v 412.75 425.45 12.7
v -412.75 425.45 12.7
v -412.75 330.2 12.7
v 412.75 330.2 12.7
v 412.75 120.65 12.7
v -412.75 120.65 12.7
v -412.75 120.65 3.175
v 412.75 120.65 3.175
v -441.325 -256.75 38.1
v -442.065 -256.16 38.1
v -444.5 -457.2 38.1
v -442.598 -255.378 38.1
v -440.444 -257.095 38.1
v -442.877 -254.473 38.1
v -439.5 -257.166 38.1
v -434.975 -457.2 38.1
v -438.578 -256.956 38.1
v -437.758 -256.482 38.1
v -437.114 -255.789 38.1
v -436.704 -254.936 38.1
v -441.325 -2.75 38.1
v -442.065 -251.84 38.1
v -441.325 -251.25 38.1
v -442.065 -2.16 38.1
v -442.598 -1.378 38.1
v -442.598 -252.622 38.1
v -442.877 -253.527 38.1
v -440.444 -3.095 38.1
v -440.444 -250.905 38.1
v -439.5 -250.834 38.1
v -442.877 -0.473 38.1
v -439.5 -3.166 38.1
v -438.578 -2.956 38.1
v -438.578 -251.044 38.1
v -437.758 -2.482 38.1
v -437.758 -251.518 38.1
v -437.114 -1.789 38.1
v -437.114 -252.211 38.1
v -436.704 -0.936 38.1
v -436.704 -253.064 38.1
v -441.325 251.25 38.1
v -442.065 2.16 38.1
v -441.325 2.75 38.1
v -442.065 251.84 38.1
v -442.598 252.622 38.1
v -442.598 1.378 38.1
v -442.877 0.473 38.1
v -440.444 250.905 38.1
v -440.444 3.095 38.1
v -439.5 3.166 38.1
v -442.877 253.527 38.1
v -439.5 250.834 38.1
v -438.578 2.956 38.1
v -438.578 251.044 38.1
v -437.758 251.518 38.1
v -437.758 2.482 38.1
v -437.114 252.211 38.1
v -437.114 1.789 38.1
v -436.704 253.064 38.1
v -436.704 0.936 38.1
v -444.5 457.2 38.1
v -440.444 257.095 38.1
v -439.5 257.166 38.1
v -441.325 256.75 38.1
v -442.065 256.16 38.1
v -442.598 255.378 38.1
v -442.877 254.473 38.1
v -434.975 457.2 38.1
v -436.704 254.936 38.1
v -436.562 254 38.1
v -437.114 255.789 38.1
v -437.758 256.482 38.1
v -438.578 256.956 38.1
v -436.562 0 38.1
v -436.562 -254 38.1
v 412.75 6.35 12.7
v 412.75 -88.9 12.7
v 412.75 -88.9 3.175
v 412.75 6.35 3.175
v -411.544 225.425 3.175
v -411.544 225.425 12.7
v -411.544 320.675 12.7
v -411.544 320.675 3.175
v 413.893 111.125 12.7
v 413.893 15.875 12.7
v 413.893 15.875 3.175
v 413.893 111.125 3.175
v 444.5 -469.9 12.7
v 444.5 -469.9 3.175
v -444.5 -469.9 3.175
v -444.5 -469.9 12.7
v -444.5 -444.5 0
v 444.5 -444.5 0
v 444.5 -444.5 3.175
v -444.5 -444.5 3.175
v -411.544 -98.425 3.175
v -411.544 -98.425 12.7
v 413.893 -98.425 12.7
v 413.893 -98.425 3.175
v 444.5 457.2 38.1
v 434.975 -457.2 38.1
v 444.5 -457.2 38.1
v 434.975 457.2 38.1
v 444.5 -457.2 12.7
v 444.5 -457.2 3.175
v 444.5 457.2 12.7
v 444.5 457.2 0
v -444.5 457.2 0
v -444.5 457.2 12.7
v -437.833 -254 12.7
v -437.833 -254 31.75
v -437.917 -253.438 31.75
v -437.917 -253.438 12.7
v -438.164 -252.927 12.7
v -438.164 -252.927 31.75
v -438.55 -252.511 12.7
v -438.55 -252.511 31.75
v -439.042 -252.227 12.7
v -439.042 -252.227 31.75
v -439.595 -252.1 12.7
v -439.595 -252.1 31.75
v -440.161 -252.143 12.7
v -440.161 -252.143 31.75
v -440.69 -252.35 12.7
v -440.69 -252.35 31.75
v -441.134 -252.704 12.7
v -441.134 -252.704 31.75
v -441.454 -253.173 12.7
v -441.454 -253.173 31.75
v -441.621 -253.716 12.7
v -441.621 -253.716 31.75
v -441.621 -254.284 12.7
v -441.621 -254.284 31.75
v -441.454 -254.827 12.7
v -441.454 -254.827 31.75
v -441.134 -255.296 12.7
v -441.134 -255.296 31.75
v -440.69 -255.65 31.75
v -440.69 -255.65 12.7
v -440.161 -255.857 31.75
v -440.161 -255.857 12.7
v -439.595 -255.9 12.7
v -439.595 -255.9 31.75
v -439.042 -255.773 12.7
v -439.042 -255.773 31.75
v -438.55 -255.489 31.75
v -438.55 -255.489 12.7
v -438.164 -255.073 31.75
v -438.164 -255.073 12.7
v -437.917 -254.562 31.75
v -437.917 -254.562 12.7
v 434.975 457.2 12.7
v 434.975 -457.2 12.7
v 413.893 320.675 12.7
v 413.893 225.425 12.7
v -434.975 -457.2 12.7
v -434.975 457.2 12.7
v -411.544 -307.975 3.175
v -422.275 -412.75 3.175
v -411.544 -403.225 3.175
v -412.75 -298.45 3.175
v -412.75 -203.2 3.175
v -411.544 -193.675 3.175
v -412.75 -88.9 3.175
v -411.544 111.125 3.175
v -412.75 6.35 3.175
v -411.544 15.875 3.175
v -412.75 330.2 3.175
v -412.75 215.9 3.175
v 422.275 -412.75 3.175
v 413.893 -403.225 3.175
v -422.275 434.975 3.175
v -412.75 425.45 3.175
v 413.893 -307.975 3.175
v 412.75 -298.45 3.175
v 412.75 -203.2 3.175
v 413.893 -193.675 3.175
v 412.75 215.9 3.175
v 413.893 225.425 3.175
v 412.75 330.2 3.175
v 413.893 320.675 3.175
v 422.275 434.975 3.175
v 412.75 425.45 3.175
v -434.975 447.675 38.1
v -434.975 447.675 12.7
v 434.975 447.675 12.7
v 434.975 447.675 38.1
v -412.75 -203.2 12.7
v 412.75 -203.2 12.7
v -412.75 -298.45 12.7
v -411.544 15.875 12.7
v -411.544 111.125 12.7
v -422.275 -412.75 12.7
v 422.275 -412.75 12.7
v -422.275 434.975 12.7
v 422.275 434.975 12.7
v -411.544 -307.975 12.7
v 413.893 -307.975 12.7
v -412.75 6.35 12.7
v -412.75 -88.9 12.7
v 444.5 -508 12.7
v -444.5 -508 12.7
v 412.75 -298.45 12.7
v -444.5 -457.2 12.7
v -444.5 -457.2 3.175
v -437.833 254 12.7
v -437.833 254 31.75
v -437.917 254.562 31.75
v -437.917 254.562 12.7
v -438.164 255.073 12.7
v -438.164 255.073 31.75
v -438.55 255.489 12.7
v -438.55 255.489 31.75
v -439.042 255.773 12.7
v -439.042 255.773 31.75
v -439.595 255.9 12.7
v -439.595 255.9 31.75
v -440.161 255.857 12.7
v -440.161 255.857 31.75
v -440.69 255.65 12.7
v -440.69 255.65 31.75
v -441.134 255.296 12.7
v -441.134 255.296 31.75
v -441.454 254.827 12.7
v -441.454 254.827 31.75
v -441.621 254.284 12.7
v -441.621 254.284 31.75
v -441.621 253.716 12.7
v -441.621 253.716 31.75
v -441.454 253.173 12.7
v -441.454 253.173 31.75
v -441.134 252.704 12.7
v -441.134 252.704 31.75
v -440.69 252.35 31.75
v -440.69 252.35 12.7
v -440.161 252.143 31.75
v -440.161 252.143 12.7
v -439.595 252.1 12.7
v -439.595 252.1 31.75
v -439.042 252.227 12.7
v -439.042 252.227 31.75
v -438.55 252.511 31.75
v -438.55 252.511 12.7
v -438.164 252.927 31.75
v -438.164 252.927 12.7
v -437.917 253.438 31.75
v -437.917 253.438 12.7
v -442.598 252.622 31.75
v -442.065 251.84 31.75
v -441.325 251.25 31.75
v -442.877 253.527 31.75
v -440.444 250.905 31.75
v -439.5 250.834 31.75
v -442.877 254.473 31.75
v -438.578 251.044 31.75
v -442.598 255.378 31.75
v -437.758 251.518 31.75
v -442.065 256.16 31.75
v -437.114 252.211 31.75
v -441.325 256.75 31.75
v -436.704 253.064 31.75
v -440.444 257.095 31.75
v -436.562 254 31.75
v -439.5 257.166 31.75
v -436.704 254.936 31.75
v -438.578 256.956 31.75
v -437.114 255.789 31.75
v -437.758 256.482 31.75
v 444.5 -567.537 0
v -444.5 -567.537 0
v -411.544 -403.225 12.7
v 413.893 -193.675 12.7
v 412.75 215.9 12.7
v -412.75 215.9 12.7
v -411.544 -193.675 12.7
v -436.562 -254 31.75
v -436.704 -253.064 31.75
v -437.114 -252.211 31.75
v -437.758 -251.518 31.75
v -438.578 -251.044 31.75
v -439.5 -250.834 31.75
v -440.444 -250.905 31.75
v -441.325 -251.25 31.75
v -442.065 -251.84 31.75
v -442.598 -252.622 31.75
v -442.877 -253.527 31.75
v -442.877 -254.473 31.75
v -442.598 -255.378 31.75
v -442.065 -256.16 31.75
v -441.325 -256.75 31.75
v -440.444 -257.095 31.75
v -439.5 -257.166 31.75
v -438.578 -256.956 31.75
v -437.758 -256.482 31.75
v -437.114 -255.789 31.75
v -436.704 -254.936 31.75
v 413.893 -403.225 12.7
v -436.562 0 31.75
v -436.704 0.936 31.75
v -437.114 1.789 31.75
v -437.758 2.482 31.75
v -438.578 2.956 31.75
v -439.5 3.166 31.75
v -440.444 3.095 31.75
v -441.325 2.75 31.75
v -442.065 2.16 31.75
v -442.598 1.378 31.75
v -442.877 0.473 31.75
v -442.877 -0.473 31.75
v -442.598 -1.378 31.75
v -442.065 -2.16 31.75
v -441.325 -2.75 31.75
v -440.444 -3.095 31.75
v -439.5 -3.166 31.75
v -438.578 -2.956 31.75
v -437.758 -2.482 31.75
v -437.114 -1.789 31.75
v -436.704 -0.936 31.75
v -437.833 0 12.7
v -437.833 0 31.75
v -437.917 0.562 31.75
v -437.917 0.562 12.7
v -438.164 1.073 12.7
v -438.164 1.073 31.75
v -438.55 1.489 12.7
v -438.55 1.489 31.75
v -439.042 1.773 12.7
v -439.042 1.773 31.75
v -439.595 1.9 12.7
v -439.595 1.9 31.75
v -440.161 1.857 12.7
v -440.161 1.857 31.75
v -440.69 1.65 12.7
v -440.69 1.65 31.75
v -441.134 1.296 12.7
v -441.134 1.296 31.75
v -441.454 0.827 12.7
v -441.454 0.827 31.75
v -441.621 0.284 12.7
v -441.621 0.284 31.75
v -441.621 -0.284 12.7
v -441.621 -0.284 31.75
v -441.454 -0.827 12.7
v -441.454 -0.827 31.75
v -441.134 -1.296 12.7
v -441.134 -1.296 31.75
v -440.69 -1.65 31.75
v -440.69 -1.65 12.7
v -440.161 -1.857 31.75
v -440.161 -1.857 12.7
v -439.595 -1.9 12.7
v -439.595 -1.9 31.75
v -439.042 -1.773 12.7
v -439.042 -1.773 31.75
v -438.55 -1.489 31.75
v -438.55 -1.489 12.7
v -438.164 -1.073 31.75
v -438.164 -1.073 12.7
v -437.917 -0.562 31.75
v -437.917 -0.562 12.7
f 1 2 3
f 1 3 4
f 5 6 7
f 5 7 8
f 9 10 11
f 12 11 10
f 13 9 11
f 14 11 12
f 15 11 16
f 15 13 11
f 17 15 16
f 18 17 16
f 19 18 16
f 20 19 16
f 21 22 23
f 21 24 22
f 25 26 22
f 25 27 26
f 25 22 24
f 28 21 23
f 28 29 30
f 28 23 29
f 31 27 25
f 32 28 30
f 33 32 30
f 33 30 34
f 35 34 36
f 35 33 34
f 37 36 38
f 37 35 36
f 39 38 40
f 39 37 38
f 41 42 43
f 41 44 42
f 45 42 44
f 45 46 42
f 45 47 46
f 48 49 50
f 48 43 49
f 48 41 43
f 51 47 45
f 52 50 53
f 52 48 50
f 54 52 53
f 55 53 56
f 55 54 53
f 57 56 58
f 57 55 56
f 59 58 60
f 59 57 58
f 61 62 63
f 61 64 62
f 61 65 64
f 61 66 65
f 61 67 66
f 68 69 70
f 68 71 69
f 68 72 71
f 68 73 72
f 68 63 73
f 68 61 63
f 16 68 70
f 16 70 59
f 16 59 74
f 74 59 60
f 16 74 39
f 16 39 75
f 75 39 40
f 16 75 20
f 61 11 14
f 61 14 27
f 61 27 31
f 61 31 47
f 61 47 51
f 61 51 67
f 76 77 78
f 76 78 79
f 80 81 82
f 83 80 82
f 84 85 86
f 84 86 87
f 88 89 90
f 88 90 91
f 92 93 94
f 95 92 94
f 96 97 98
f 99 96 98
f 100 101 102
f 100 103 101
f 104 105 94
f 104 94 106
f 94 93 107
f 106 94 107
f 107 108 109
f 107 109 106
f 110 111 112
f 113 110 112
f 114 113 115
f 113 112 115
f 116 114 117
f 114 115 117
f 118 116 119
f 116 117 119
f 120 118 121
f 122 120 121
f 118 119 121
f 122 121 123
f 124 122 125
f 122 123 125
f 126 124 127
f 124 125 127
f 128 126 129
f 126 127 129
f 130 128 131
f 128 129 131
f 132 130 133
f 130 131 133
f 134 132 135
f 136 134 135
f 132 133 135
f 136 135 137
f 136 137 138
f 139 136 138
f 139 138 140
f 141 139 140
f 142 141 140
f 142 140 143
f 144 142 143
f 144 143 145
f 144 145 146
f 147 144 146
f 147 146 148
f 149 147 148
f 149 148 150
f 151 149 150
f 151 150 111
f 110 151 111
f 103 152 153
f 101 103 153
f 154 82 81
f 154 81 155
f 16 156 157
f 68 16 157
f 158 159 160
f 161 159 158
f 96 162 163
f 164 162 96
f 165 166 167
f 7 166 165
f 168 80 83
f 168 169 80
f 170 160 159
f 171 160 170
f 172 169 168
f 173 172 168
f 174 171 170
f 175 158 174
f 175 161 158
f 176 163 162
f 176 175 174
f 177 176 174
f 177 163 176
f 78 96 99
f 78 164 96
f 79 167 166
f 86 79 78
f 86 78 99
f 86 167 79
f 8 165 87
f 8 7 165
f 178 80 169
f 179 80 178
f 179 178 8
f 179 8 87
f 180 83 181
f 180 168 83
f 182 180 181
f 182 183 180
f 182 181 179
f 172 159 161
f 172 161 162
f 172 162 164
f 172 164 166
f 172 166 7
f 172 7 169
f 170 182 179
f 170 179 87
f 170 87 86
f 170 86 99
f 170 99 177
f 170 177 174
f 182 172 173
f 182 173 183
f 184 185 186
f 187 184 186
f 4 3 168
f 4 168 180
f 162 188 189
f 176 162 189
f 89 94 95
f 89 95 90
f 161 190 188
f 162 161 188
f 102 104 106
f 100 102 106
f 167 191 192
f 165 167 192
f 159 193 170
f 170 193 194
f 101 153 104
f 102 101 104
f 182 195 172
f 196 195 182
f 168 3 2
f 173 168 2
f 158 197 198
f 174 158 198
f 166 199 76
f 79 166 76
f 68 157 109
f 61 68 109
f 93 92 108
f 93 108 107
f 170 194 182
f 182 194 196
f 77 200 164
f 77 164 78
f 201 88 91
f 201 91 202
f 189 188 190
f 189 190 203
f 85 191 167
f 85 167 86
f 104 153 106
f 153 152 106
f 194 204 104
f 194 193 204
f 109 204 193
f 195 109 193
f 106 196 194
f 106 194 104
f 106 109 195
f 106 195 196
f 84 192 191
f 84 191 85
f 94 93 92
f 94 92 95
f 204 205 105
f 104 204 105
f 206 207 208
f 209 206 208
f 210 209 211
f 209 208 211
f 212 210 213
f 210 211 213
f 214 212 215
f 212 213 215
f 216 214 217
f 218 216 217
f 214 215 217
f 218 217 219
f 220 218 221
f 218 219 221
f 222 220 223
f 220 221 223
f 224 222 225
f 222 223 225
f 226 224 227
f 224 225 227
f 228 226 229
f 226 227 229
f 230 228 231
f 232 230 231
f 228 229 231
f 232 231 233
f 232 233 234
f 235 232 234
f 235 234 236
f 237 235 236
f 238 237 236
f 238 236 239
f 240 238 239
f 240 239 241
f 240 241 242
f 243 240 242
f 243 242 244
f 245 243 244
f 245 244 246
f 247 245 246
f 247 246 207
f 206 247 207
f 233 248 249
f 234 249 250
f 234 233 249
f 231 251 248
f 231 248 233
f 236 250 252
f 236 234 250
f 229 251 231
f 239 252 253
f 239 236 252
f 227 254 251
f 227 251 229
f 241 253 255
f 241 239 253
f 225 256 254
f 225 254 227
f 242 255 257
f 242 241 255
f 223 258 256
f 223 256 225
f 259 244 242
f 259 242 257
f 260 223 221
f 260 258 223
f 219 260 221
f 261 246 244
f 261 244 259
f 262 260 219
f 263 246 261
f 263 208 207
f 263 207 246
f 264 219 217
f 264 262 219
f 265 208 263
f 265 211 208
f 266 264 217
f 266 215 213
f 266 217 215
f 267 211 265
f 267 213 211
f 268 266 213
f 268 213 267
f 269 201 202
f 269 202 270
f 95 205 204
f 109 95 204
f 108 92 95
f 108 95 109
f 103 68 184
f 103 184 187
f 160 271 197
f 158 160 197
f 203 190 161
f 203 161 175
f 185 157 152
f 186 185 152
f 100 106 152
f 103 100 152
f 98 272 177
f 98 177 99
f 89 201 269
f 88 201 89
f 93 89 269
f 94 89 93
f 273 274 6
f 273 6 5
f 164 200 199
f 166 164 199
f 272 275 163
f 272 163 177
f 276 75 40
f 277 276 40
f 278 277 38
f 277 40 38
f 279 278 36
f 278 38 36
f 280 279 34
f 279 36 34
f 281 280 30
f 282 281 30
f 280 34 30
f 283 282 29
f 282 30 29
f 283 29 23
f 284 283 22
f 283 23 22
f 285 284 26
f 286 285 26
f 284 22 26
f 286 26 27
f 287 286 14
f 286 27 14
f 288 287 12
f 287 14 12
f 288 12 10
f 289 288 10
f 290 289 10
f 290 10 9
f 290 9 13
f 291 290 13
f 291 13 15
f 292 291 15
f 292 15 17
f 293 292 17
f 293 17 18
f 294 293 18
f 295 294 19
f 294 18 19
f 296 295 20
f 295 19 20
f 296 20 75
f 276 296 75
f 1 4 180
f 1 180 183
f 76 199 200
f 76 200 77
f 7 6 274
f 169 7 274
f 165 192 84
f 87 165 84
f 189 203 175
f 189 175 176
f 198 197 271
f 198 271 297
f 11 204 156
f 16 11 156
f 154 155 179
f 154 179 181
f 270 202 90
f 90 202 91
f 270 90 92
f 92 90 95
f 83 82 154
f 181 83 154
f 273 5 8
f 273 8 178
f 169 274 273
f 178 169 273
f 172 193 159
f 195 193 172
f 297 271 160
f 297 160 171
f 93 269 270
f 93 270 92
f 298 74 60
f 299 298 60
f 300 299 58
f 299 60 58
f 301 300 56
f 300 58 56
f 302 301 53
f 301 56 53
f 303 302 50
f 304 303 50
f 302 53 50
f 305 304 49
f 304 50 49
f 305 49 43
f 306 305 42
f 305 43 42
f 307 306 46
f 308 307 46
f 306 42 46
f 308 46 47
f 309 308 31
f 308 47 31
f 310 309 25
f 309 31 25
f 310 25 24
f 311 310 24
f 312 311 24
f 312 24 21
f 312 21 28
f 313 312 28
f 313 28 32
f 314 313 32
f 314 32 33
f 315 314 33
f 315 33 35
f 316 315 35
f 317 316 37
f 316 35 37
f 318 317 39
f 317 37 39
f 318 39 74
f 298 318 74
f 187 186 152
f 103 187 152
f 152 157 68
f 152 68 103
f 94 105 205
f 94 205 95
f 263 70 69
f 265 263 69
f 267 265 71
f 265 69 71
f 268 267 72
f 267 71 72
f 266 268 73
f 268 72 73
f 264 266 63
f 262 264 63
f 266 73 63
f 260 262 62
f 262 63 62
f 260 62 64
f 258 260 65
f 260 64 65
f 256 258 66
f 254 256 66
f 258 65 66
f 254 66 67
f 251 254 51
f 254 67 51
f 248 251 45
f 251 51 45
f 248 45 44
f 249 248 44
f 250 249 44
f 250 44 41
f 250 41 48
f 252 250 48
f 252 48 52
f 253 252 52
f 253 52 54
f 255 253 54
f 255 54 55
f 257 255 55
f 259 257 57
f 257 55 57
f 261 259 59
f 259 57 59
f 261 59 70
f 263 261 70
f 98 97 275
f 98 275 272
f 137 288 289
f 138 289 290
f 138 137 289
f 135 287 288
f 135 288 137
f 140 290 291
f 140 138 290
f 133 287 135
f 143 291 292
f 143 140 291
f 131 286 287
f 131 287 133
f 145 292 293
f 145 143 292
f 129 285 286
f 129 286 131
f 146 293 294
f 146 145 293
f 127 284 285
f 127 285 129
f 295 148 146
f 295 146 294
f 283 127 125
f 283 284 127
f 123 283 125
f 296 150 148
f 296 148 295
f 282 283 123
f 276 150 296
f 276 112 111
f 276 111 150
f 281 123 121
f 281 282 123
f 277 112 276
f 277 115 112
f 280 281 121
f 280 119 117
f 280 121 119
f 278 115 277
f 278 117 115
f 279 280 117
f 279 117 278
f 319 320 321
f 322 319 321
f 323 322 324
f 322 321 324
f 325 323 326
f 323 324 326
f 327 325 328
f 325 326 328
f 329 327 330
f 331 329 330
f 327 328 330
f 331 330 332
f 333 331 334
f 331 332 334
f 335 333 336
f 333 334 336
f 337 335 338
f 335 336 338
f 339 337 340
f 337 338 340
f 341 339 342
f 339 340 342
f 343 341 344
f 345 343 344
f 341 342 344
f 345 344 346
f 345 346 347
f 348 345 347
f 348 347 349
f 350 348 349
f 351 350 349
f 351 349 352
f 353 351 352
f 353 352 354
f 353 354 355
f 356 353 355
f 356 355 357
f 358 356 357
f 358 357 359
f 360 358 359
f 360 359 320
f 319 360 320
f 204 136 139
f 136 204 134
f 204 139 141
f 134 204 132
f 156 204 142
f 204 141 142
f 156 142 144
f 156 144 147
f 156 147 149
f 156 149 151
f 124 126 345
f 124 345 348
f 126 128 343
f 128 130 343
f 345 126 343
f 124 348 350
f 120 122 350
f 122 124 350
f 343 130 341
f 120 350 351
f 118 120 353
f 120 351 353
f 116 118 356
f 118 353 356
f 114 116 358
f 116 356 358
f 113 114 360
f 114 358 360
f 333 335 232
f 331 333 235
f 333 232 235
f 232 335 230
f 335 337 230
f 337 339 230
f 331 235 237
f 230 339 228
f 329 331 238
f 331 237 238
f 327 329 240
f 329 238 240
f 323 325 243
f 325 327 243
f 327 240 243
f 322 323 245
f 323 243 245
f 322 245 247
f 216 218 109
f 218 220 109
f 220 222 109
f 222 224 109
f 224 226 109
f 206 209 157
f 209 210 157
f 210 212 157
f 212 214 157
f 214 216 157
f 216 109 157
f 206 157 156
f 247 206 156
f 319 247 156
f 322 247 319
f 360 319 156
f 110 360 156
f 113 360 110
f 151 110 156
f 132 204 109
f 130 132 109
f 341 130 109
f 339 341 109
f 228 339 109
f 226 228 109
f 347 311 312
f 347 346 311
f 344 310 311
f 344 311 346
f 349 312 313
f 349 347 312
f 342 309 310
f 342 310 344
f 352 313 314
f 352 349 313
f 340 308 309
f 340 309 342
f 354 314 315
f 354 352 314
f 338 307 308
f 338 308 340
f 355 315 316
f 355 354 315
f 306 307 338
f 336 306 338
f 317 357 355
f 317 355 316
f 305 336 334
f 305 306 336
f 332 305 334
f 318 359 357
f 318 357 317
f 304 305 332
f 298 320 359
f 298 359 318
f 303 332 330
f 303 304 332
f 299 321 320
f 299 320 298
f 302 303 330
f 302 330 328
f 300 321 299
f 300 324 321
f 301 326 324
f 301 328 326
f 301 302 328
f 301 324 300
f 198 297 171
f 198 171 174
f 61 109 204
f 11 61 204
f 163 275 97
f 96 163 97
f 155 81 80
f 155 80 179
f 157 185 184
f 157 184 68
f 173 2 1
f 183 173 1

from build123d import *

# Parameters (mm, degrees)
F0_W      = 889
F0_H      = 914.4
F1_DEPTH  = 12.7
F2_W      = 12.7
F2_H      = 3.175
F3_DEPTH  = 889.001
F5_DEPTH  = 889
F7_DEPTH  = 25.4
F8_DEPTH  = 25.4
F6_W      = 869.95
F6_H      = 9.525
F9_DEPTH  = 25.4
F10_W     = 844.55
F10_H     = 847.725
F10_W_2   = 825.4364864731
F10_H_2   = 95.25
F10_W_3   = 825.5
F11_DEPTH = 9.525
F13_R     = 3.175
F13_R_2   = 1.905
F14_DEPTH = 6.35
F15_DEPTH = 25.4


with BuildPart() as f1:
    # F0 (on Top) → F1 (new body)
    with BuildSketch(Plane.XY):
        Rectangle(F0_W, F0_H)
    extrude(amount=F1_DEPTH)

    # F2 (on face) → F3 (cut, through all)
    with BuildSketch(Plane.YZ.offset(444.5)):
        with Locations((-450.85, 1.5875)):
            Rectangle(F2_W, F2_H)
    extrude(amount=-F3_DEPTH, mode=Mode.SUBTRACT)

    # F10 (on face) → F11 (cut)
    with BuildSketch(Plane.XY.offset(12.7)):
        with Locations((0, 11.1125)):
            Rectangle(F10_W, F10_H)
        with Locations((1.1747297096, -355.6)):
            Rectangle(F10_W_2, F10_H_2, mode=Mode.SUBTRACT)
        with Locations((0, -250.825)):
            Rectangle(F10_W_3, F10_H_2, mode=Mode.SUBTRACT)
        with Locations((1.1747297096, -146.05)):
            Rectangle(F10_W_2, F10_H_2, mode=Mode.SUBTRACT)
        with Locations((0, -41.275)):
            Rectangle(F10_W_3, F10_H_2, mode=Mode.SUBTRACT)
        with Locations((1.1747297096, 63.5)):
            Rectangle(F10_W_2, F10_H_2, mode=Mode.SUBTRACT)
        with Locations((0, 168.275)):
            Rectangle(F10_W_3, F10_H_2, mode=Mode.SUBTRACT)
        with Locations((1.1747297096, 273.05)):
            Rectangle(F10_W_2, F10_H_2, mode=Mode.SUBTRACT)
        with Locations((0, 377.825)):
            Rectangle(F10_W_3, F10_H_2, mode=Mode.SUBTRACT)
    extrude(amount=-F11_DEPTH, mode=Mode.SUBTRACT)


with BuildPart() as f5:
    # F4 (on face) → F5 (new body, through all)
    with BuildSketch(Plane.YZ.offset(444.5)):
        Polygon((-469.9, 12.7), (-508, 12.7), (-567.5374269485, 0), (-444.5, 0), (-444.5, 3.175), (-457.2, 3.175), (-469.9, 3.175), align=None)
    extrude(amount=-F5_DEPTH)


with BuildPart() as f7:
    # F6 (on face) → F7 (new body)
    with BuildSketch(Plane.XY.offset(12.7)):
        Polygon((434.975, -457.2), (444.5, -457.2), (444.5, 457.2), (434.975, 457.2), (434.975, 447.675), align=None)
    extrude(amount=F7_DEPTH)


with BuildPart() as f8:
    # F6 (on face) → F8 (new body)
    with BuildSketch(Plane.XY.offset(12.7)):
        Polygon((-444.5, -457.2), (-434.975, -457.2), (-434.975, 447.675), (-434.975, 457.2), (-444.5, 457.2), align=None)
    extrude(amount=F8_DEPTH)

    # F13 (on face) → F14 (cut)
    with BuildSketch(Plane.XY.offset(38.1)):
        with Locations((-439.7375, -254)):
            Circle(F13_R)
        with Locations((-439.7375, -254)):
            Circle(F13_R_2, mode=Mode.SUBTRACT)
        with Locations((-439.7375, 0)):
            Circle(F13_R)
        with Locations((-439.7375, 0)):
            Circle(F13_R_2, mode=Mode.SUBTRACT)
        with Locations((-439.7375, 254)):
            Circle(F13_R)
        with Locations((-439.7375, 254)):
            Circle(F13_R_2, mode=Mode.SUBTRACT)
        with Locations((439.7375, 254)):
            Circle(F13_R)
        with Locations((439.7375, 254)):
            Circle(F13_R_2, mode=Mode.SUBTRACT)
        with Locations((439.7375, 0)):
            Circle(F13_R)
        with Locations((439.7375, 0)):
            Circle(F13_R_2, mode=Mode.SUBTRACT)
        with Locations((439.7375, -254)):
            Circle(F13_R)
        with Locations((439.7375, -254)):
            Circle(F13_R_2, mode=Mode.SUBTRACT)
    extrude(amount=-F14_DEPTH, mode=Mode.SUBTRACT)

    # F15 (cut, through all): faces of the model
    f15_faces = [f8.faces().sort_by_distance(p)[0] for p in [
        (-439.7375, -254, 38.1),
        (-439.7375, 0, 38.1),
        (-439.7375, 254, 38.1),
    ]]
    extrude(f15_faces, amount=-F15_DEPTH, mode=Mode.SUBTRACT)


with BuildPart() as f9:
    # F6 (on face) → F9 (new body)
    with BuildSketch(Plane.XY.offset(12.7)):
        with Locations((0, 452.4375)):
            Rectangle(F6_W, F6_H)
    extrude(amount=F9_DEPTH)


solid = Compound([f1.part, f5.part, f7.part, f8.part, f9.part])
